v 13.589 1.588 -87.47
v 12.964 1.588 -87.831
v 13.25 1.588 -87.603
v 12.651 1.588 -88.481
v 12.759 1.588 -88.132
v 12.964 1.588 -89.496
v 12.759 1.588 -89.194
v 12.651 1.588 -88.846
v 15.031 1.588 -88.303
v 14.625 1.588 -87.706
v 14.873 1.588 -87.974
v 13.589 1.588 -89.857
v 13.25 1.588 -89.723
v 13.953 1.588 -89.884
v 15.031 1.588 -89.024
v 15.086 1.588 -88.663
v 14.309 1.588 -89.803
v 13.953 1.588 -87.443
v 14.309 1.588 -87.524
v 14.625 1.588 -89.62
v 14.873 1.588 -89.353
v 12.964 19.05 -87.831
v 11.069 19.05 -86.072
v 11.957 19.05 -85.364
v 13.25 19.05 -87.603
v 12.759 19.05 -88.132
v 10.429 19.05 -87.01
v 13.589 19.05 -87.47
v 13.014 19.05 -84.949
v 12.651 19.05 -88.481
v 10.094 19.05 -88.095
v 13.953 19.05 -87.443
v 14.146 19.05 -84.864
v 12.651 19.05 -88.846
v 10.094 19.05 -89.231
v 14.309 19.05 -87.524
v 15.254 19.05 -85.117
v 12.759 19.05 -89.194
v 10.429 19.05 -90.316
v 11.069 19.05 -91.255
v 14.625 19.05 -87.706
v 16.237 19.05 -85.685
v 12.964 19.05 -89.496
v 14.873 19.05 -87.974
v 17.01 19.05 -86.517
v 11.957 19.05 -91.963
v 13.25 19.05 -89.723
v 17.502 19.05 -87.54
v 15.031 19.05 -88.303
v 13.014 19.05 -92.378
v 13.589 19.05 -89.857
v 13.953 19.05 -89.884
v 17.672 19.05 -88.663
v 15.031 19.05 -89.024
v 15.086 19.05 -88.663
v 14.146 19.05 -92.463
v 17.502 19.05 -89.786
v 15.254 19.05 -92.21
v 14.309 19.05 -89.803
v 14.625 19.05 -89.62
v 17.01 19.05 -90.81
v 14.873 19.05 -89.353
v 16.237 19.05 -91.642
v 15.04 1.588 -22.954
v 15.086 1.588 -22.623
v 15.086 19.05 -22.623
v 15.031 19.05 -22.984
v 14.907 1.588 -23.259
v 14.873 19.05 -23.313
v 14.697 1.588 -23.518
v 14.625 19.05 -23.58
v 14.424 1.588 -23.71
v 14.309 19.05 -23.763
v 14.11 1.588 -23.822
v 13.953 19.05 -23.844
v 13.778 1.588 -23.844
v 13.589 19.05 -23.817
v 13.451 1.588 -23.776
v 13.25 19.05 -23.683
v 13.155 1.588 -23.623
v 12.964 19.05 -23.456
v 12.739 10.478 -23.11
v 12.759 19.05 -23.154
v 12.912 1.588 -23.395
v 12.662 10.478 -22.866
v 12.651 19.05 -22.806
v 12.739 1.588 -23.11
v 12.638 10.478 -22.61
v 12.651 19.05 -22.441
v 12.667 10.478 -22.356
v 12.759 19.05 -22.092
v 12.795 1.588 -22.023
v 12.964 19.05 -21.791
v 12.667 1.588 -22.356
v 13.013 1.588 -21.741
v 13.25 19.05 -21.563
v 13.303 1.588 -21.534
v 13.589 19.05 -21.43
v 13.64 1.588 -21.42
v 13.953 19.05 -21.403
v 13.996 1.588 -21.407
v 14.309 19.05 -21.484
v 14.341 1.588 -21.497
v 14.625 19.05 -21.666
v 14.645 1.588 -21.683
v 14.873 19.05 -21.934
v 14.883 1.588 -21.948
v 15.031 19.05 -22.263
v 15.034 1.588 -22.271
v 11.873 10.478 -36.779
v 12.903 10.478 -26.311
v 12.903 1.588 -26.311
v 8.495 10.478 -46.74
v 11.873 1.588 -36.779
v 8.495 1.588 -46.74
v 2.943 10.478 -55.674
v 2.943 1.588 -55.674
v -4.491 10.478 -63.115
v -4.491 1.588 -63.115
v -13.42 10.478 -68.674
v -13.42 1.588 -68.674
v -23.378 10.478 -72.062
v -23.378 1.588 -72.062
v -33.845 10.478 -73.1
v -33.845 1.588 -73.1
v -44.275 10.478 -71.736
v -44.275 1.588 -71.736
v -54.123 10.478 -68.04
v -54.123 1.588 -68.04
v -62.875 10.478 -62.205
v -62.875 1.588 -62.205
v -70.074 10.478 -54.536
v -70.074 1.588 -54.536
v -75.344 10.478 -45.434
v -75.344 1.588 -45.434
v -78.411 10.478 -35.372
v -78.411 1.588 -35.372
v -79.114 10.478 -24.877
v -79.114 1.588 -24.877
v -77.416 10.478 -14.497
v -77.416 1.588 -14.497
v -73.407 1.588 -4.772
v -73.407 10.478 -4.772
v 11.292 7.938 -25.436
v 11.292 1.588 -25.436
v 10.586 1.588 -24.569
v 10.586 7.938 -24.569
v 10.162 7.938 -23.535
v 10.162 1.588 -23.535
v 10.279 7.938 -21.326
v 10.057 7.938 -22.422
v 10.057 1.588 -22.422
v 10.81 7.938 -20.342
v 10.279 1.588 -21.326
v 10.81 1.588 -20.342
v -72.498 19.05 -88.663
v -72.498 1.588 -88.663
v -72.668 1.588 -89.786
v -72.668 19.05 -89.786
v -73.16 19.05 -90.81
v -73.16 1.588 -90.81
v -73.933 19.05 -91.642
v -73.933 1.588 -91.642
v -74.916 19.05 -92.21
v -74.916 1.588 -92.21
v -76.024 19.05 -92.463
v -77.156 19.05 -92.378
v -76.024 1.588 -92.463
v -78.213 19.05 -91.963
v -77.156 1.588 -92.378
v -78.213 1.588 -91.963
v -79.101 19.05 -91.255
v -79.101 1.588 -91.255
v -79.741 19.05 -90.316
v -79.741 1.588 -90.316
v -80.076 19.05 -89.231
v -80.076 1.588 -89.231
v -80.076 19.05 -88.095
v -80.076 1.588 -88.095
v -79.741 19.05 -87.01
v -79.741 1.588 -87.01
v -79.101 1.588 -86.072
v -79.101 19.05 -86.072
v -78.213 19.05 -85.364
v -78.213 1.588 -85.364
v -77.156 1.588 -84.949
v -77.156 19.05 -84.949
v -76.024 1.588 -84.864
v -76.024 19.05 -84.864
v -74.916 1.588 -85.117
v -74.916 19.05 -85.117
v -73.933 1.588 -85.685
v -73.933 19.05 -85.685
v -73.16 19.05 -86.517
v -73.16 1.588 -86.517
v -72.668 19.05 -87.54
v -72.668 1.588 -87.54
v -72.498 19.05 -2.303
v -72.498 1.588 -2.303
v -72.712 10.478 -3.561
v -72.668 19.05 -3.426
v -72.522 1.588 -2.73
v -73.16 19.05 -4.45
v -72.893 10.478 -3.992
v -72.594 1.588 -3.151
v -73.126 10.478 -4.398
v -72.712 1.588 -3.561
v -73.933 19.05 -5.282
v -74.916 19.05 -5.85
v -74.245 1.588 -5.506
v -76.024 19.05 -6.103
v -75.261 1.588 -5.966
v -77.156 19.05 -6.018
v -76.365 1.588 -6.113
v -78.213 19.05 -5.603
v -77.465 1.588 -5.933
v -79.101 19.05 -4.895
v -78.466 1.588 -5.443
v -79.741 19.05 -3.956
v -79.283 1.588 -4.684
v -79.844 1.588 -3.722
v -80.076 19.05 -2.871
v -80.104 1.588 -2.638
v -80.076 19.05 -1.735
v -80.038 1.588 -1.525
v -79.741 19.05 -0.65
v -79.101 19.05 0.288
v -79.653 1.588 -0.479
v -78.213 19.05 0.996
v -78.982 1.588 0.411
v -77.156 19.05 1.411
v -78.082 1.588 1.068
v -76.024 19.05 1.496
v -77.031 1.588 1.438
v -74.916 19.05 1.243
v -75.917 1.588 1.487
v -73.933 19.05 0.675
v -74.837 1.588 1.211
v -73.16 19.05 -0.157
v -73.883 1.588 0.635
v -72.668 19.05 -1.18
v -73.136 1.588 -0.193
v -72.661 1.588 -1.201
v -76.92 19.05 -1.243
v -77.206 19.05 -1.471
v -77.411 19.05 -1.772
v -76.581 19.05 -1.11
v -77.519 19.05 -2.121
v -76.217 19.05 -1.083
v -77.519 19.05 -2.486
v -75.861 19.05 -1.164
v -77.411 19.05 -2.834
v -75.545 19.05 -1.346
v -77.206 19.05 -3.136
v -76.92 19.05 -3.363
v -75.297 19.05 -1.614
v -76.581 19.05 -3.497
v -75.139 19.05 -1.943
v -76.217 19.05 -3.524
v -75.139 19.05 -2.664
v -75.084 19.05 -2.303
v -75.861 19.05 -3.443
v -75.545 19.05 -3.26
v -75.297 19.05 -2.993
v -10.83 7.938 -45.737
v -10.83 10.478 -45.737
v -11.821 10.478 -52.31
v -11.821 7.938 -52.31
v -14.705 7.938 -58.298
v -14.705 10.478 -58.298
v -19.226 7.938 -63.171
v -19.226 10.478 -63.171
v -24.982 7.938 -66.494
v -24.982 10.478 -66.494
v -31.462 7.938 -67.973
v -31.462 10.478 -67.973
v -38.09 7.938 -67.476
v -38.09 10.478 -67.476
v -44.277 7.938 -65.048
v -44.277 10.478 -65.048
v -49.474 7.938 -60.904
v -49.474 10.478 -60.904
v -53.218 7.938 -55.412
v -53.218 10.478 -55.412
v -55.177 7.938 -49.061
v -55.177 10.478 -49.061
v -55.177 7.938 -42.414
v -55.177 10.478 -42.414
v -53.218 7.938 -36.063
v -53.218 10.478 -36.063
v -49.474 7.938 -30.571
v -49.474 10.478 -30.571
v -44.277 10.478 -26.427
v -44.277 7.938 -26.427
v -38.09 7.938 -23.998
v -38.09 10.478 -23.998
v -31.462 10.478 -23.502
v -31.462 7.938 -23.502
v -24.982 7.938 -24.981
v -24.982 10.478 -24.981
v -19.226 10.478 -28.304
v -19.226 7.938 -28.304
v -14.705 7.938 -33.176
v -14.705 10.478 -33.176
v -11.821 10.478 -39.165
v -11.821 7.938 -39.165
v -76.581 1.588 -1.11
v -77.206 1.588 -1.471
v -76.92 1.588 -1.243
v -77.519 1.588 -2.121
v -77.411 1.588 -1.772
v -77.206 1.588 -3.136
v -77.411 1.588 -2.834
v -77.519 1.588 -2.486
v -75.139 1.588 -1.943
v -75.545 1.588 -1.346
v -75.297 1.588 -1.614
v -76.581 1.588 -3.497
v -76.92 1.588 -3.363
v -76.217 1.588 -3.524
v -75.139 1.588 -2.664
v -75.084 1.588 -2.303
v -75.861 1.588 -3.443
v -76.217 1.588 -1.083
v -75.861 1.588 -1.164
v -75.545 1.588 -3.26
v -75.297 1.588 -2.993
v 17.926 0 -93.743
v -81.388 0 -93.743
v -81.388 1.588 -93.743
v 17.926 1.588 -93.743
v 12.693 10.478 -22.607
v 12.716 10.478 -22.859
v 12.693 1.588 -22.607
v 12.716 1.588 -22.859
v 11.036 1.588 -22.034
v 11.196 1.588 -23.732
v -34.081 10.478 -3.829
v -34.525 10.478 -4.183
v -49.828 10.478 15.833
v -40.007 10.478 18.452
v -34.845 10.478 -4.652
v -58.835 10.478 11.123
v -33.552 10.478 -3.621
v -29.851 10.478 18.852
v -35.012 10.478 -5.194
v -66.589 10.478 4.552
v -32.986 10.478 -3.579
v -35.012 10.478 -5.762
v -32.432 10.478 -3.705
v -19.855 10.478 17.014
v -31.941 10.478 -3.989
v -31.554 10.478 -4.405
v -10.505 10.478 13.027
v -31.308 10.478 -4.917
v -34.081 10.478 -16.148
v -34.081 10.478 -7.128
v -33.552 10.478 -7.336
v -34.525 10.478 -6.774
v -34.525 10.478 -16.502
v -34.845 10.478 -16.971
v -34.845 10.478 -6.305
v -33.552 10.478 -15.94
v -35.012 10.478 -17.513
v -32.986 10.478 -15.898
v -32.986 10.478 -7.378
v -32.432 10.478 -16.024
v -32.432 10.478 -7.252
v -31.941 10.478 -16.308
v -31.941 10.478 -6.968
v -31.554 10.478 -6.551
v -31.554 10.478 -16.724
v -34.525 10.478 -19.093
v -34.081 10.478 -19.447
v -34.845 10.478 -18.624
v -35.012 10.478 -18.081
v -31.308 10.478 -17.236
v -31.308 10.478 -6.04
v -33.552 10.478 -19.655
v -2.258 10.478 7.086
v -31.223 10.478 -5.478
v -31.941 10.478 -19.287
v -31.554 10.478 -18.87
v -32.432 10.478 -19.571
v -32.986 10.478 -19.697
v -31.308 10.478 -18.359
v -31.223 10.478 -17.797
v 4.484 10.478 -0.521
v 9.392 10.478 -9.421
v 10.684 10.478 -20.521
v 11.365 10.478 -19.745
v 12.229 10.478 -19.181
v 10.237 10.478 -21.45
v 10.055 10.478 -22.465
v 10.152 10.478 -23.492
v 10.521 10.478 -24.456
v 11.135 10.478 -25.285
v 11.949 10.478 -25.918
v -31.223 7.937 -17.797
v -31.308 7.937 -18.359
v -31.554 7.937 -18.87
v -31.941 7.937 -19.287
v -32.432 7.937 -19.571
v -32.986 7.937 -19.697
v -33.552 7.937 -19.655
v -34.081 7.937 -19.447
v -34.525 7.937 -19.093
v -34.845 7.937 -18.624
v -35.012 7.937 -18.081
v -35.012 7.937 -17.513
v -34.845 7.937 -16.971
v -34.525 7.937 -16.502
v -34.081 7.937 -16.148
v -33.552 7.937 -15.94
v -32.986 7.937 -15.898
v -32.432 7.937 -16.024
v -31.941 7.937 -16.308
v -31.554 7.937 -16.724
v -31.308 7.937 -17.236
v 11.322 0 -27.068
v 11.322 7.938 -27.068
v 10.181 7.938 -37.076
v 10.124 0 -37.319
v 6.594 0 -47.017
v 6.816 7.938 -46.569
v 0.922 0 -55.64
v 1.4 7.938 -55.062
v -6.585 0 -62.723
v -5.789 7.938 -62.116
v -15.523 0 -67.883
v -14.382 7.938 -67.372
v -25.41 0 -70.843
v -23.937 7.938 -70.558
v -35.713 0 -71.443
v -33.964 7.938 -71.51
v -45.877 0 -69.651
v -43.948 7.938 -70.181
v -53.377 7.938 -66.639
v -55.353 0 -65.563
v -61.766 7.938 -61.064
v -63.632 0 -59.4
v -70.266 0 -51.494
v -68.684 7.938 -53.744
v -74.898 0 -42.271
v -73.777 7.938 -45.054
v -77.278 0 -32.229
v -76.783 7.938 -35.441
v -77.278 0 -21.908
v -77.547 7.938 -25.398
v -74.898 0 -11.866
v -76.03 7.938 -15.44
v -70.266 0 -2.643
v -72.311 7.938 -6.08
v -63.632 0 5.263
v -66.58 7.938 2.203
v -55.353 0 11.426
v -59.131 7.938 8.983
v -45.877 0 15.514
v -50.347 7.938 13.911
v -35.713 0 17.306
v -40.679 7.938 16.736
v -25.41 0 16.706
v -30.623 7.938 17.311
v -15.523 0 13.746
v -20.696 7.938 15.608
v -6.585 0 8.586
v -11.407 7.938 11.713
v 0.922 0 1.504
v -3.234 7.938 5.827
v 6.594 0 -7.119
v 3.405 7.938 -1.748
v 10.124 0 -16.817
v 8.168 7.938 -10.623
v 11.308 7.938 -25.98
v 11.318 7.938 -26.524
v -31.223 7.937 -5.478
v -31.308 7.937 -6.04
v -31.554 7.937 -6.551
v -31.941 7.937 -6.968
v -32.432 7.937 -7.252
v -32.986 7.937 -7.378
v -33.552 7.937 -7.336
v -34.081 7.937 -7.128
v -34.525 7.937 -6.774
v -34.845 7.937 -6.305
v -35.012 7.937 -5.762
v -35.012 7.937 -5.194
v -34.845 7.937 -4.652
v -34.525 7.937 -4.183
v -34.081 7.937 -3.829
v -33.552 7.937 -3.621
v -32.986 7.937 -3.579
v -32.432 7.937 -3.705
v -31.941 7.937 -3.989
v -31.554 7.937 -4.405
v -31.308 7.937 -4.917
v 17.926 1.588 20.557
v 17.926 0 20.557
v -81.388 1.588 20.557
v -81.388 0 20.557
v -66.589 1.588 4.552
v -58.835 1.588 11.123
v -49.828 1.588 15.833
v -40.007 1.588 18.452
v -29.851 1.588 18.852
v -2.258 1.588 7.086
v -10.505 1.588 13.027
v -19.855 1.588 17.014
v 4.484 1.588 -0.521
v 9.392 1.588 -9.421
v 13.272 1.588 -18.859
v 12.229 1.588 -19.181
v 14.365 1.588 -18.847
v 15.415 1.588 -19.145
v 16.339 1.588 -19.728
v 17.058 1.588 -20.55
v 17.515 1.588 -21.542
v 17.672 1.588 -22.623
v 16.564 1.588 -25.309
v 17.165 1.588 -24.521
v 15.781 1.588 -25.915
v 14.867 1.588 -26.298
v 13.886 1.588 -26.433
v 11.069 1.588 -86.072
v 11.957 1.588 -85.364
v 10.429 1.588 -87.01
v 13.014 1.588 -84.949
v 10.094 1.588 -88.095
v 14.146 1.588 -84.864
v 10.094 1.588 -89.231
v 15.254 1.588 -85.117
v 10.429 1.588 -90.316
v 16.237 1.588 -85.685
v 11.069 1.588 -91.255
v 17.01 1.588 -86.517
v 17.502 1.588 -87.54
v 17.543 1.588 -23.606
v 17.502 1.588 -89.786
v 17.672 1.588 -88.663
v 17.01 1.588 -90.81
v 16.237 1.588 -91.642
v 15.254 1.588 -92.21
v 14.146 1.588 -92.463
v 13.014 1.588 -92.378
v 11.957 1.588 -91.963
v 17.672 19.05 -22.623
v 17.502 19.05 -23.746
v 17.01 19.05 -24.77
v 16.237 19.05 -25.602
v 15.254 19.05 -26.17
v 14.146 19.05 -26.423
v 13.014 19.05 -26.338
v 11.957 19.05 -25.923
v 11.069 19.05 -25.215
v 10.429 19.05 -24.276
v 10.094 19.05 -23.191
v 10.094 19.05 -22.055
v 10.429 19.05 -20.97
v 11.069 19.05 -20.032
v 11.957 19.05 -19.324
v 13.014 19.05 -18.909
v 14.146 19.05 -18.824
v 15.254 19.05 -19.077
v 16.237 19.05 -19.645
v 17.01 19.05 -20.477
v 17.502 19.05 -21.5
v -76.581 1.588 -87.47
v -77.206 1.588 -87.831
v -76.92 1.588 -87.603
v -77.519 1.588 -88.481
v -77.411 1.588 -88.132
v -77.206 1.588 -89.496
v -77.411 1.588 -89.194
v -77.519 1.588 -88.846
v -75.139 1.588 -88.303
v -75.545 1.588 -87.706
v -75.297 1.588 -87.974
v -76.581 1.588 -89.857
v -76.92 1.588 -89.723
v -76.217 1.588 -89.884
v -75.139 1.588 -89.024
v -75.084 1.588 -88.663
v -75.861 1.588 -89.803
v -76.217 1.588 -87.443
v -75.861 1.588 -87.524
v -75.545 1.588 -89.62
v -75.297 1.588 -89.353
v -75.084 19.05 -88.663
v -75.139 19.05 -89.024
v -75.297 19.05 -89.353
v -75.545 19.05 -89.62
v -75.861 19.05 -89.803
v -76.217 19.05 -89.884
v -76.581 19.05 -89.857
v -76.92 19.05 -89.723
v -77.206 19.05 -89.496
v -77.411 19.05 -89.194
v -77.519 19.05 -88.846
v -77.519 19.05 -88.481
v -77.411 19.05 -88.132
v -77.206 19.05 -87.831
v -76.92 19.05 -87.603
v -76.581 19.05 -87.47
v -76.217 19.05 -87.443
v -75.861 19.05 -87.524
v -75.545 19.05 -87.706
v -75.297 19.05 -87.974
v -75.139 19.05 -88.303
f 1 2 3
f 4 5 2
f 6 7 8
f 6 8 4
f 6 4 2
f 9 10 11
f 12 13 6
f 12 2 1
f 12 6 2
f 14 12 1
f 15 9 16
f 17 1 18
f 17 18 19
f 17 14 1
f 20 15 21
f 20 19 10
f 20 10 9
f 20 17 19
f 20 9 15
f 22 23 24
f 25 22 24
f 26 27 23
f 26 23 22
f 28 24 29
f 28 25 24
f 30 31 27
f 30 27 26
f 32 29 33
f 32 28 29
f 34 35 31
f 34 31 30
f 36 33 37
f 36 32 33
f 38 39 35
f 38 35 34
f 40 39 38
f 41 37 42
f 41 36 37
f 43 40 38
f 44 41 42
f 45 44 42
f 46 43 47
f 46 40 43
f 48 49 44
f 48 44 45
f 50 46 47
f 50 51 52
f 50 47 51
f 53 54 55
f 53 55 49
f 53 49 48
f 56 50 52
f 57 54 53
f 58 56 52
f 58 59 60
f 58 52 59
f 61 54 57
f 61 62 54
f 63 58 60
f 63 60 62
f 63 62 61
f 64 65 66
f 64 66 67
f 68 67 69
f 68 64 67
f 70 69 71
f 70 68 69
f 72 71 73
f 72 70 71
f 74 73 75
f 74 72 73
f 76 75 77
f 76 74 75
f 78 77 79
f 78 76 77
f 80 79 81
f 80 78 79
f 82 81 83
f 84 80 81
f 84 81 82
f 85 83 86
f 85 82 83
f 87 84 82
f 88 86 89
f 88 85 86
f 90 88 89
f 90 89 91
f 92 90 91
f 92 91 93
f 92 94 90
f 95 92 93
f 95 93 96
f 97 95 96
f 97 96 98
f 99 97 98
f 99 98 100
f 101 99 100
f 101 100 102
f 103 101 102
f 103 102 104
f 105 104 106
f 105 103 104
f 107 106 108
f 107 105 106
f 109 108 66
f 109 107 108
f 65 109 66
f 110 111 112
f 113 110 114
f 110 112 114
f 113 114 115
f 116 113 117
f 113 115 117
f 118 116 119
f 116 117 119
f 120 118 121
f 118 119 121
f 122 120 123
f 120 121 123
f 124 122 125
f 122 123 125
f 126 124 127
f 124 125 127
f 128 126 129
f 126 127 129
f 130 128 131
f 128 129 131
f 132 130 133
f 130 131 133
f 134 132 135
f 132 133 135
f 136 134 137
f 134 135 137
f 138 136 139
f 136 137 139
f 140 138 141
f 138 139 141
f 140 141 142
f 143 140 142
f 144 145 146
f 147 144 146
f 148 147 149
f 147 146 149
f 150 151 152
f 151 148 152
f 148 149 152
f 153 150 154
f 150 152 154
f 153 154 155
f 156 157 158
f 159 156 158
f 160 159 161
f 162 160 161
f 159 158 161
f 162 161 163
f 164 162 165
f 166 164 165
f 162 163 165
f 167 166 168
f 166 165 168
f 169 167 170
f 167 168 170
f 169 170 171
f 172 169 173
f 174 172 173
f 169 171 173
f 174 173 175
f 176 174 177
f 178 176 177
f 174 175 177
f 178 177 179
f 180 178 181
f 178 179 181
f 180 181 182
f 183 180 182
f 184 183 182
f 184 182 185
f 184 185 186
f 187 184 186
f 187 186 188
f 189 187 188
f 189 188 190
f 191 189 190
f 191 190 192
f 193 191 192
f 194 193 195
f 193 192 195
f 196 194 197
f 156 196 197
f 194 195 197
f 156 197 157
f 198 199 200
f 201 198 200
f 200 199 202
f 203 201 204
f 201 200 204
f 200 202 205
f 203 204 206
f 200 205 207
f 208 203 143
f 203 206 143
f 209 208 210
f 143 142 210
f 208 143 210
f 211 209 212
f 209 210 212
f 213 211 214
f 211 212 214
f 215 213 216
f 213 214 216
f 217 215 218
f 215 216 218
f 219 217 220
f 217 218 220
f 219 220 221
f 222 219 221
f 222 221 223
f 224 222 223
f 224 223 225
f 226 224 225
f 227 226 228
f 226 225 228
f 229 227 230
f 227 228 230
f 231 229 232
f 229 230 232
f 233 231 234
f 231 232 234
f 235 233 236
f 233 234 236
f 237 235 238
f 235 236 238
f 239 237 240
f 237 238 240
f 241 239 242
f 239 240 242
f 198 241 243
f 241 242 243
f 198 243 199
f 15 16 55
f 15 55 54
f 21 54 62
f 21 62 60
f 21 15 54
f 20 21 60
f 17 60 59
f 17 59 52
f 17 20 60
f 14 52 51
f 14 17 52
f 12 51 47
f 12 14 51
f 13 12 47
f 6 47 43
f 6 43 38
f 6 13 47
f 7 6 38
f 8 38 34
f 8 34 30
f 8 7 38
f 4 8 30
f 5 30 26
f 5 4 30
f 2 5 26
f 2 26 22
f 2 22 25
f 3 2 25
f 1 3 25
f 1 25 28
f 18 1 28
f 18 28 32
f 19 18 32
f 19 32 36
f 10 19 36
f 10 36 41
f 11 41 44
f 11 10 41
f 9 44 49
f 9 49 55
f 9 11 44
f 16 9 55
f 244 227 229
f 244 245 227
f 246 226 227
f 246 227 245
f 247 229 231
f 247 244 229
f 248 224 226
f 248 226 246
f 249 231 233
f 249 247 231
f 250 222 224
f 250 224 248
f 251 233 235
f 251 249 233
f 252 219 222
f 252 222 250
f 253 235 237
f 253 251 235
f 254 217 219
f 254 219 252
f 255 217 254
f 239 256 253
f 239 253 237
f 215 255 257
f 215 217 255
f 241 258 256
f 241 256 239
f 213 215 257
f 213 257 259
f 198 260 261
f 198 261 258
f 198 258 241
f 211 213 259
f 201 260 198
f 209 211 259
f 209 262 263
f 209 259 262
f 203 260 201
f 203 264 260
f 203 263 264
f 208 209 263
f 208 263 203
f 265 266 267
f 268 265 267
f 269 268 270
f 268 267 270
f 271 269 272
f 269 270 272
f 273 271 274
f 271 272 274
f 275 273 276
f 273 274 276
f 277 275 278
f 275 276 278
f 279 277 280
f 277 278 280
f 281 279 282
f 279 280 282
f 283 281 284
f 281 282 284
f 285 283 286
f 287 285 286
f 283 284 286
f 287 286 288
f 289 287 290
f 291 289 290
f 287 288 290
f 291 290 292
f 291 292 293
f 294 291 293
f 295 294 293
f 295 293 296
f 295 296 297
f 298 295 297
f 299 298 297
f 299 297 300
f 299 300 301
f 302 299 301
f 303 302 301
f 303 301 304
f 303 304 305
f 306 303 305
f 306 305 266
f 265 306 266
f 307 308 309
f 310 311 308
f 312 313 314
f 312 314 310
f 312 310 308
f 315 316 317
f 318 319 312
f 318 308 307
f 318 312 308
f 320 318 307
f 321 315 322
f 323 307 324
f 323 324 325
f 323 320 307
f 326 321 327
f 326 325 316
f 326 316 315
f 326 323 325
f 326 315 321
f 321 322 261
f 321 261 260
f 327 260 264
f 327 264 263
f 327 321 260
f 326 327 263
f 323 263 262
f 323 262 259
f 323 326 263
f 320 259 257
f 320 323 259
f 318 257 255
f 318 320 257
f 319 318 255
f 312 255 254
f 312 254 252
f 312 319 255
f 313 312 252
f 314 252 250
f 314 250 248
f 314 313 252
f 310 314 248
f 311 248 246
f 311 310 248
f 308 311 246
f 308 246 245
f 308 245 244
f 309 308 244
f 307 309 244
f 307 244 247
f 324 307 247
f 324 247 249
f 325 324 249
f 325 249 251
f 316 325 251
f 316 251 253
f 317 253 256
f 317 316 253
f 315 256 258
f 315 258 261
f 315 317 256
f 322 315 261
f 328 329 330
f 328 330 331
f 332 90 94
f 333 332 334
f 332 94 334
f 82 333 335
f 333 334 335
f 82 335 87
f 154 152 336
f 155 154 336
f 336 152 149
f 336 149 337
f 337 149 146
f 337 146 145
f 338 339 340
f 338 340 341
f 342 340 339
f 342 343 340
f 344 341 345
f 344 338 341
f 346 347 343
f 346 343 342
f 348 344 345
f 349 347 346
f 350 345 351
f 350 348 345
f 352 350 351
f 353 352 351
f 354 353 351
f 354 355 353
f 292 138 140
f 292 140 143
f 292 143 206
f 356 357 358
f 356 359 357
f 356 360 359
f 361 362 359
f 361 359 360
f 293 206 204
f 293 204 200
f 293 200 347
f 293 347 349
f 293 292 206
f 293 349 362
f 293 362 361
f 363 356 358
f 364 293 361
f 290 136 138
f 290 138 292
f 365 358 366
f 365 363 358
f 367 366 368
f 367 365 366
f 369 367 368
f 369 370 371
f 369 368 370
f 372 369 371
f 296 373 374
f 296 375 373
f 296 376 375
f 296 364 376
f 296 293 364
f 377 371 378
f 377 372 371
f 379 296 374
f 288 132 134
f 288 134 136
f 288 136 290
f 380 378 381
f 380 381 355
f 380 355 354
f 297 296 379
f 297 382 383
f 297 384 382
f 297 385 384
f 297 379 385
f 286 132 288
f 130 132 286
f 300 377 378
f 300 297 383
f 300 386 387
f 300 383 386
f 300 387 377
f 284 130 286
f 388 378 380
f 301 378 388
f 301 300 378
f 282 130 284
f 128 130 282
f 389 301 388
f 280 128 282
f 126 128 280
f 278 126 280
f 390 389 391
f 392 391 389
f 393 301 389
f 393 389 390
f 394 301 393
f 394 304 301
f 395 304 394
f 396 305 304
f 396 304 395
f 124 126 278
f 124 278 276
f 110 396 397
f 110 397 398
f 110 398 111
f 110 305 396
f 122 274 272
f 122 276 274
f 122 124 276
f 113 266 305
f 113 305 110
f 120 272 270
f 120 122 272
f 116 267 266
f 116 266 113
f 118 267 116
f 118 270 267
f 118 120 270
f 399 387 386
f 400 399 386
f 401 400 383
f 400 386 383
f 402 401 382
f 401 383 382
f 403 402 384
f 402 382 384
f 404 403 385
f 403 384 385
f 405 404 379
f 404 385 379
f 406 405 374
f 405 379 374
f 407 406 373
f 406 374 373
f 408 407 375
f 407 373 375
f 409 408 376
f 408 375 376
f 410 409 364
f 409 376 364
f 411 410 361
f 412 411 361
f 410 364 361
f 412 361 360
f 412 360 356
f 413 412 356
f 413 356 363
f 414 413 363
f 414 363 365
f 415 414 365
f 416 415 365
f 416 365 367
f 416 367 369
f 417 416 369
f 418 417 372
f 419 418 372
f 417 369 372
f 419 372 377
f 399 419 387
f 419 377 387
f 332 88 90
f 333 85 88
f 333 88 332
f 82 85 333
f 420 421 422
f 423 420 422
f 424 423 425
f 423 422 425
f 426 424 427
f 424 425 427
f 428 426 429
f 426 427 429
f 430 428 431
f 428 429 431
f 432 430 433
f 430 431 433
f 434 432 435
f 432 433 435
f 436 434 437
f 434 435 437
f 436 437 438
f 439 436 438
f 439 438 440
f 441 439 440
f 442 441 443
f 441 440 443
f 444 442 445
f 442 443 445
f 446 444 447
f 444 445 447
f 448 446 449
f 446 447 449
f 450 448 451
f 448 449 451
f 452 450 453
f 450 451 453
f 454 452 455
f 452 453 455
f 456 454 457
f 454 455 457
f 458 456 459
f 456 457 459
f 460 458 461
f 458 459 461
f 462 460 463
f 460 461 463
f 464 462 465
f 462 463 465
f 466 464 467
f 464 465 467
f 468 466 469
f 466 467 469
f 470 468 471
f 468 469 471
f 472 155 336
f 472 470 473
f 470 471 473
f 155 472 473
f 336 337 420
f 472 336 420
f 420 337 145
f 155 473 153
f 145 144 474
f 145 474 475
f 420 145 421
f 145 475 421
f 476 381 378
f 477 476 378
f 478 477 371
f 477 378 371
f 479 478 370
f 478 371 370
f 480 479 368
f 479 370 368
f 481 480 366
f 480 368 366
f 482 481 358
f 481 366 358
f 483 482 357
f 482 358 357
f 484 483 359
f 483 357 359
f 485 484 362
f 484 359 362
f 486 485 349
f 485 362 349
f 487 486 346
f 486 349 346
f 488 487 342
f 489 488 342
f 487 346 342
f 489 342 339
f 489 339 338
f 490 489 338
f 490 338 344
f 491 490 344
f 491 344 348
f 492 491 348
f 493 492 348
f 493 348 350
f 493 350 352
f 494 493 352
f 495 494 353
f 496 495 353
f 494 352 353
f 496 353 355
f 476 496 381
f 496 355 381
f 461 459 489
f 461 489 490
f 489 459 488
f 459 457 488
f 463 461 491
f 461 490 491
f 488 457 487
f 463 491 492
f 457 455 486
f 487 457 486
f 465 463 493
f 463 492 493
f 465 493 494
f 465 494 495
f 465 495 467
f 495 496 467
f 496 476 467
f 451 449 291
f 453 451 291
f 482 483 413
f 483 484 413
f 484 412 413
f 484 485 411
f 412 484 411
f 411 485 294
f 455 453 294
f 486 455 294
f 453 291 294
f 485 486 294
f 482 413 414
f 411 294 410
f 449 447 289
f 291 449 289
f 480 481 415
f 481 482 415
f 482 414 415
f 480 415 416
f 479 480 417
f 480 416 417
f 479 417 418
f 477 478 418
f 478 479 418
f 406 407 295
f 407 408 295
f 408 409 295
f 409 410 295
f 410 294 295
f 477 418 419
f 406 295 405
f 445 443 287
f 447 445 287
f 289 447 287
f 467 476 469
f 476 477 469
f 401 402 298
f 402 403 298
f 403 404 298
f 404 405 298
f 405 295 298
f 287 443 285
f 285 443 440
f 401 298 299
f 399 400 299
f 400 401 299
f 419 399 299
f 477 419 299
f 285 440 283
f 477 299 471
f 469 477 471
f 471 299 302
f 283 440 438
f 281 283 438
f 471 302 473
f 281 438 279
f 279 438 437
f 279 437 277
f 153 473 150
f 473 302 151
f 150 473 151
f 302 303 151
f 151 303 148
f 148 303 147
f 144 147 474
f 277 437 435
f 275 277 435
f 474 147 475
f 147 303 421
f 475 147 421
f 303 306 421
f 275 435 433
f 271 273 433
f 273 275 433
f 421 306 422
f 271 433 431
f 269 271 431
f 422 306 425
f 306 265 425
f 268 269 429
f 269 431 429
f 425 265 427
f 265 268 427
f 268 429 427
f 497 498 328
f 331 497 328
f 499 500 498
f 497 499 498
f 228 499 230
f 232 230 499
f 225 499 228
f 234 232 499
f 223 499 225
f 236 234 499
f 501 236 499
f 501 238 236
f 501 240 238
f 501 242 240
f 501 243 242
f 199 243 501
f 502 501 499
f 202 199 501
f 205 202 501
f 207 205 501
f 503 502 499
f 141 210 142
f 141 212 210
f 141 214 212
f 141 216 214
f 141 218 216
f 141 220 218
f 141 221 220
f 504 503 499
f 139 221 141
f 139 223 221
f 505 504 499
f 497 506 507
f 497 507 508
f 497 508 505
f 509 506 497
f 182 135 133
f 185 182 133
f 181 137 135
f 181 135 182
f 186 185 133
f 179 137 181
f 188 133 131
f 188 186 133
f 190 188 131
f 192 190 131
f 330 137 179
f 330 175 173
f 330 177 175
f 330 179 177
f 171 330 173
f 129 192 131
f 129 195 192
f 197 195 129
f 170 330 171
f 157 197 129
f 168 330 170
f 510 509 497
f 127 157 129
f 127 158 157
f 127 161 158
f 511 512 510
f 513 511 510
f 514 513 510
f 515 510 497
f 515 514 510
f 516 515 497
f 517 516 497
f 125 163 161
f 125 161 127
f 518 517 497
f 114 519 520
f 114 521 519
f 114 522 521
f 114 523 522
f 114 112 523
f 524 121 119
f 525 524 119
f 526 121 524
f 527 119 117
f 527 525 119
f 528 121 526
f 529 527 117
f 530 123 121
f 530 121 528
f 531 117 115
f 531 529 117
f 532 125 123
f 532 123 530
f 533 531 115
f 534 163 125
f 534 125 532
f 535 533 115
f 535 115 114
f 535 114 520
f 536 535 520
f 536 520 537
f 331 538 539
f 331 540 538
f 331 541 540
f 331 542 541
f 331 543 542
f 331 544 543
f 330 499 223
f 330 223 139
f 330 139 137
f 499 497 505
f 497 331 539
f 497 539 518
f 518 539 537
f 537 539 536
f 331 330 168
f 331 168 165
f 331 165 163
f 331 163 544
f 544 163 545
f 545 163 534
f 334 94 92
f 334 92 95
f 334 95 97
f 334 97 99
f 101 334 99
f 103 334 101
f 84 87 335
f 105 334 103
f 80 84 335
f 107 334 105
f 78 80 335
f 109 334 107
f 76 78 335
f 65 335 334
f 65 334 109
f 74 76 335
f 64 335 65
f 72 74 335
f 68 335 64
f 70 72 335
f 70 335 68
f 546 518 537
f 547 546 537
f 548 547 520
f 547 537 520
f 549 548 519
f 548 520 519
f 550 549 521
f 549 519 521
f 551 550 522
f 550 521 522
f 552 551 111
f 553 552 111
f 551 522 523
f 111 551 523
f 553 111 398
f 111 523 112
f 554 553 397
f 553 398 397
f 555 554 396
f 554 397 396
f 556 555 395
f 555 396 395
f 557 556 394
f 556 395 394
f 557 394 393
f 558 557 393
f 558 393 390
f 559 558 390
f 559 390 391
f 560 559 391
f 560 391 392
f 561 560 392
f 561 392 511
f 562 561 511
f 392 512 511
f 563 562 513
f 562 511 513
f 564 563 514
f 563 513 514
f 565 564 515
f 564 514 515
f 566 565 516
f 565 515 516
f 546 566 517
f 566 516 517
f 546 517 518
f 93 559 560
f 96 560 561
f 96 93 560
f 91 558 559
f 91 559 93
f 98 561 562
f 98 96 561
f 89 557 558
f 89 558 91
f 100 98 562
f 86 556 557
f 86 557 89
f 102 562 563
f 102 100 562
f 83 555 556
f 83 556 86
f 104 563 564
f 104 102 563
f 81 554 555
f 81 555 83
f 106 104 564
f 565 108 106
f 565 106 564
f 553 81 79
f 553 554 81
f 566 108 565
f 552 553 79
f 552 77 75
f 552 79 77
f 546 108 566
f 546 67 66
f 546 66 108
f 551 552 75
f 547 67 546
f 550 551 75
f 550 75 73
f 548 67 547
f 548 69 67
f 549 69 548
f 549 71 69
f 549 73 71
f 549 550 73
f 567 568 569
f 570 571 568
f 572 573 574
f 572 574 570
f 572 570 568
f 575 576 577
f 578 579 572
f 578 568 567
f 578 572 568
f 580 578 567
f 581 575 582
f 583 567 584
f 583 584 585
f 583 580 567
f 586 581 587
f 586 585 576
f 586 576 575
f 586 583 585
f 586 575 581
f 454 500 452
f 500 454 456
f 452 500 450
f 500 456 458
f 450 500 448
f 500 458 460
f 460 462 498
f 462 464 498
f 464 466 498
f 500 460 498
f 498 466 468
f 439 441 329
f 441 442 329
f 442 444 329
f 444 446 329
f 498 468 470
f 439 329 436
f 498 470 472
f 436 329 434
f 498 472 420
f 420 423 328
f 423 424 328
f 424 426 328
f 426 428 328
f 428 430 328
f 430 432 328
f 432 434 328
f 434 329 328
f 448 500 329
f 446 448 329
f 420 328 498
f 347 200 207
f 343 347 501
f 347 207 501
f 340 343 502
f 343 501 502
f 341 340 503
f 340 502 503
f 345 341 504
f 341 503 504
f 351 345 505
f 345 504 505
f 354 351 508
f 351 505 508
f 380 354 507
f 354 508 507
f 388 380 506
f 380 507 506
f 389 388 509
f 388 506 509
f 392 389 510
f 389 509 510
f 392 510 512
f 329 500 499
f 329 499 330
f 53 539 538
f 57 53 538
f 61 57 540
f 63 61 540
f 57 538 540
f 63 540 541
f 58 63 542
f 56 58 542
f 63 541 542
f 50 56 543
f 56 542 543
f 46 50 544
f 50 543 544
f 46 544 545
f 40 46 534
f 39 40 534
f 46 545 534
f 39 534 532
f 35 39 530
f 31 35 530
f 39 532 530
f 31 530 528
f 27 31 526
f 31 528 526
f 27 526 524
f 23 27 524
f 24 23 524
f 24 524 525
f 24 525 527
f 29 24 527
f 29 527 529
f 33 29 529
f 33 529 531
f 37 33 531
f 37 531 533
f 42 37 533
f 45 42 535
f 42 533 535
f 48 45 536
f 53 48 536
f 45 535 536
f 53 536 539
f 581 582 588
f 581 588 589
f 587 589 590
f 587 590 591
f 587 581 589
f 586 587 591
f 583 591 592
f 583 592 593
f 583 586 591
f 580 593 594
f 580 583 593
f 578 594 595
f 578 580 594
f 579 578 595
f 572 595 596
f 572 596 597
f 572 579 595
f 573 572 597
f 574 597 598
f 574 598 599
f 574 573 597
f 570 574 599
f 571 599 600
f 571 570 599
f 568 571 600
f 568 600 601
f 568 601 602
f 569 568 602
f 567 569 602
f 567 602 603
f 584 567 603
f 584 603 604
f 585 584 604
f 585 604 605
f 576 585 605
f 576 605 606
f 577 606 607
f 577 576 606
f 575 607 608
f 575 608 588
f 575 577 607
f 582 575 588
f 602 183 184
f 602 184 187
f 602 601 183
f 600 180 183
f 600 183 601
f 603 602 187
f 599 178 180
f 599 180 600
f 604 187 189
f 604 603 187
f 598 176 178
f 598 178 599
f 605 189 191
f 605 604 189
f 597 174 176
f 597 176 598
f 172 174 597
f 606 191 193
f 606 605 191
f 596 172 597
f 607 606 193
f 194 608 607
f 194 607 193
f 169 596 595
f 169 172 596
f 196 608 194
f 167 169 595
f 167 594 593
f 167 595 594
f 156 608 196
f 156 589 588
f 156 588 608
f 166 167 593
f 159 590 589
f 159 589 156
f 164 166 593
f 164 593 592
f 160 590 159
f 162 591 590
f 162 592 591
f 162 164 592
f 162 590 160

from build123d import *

# Parameters (mm, degrees)
SKETCH1_W                        = 99.314
SKETCH1_H                        = 114.3
MAIN_DEPTH                       = 1.5875
SKETCH3_R                        = 46.0375
RAISED_DISK_EDGE_DEPTH           = 10.4775
SKETCH4_R                        = 44.45
DISK_HOLLOW_DEPTH                = 8.9375
SKETCH5_R                        = 1.905
SCREW_HOLES_ON_FRONT_PANEL_DEPTH = 2.54
SKETCH6_R                        = 3.81
SKETCH6_R_2                      = 1.2239625
MOUNTING_POSTS_DEPTH             = 17.4625
HOLLOW_REACH                     = 12.478
SKETCH8_R                        = 22.29794733


with BuildPart() as part:
    # Sketch1 → main (new body)
    with BuildSketch(Plane(origin=(0, 0, 0), x_dir=(1, 0, 0), z_dir=(0, 1, 0))):
        with Locations((-31.731304389, 36.593342839)):
            Rectangle(SKETCH1_W, SKETCH1_H)
    extrude(amount=MAIN_DEPTH)


with BuildPart() as body_2:
    # Sketch3 → raised disk edge (new body)
    with BuildSketch(Plane(origin=(0, 0, 0), x_dir=(1, 0, 0), z_dir=(0, 1, 0))):
        with Locations((-33.128304389, 27.068342839)):
            Circle(SKETCH3_R)
    extrude(amount=RAISED_DISK_EDGE_DEPTH)


with BuildPart() as disk_hollow_tool:
    # Sketch4 → disk hollow (new body, through all)
    with BuildSketch(Plane(origin=(0, 7.9375, 0), x_dir=(1, 0, 0), z_dir=(0, 1, 0))):
        with Locations((-33.128304389, 27.068342839)):
            Circle(SKETCH4_R)
    extrude(amount=-DISK_HOLLOW_DEPTH)


with BuildPart() as part_1:
    add(part.part)

    # disk hollow: cut by disk_hollow_tool
    add(disk_hollow_tool.part, mode=Mode.SUBTRACT)



with BuildPart() as body_2_1:
    add(body_2.part)

    # disk hollow: cut by disk_hollow_tool
    add(disk_hollow_tool.part, mode=Mode.SUBTRACT)

    # Sketch5 → screw holes on front panel (cut)
    with BuildSketch(Plane(origin=(0, 10.4775, 0), x_dir=(1, 0, 0), z_dir=(0, 1, 0))):
        with Locations((-33.128304389, 17.797342839)):
            Circle(SKETCH5_R)
        with Locations((-33.128304389, 5.478342839)):
            Circle(SKETCH5_R)
    extrude(amount=-SCREW_HOLES_ON_FRONT_PANEL_DEPTH, mode=Mode.SUBTRACT)


with BuildPart() as part_2:
    add(part_1.part)

    add(body_2_1.part)  # mounting posts merges body 2
    # Sketch6 → mounting posts (add)
    with BuildSketch(Plane(origin=(0, 1.5875, 0), x_dir=(1, 0, 0), z_dir=(0, 1, 0))):
        with Locations((-76.308304389, 2.303342839)):
            Circle(SKETCH6_R)
        with Locations((-76.308304389, 2.303342839)):
            Circle(SKETCH6_R_2, mode=Mode.SUBTRACT)
        with Locations((13.861695611, 22.623342839)):
            Circle(SKETCH6_R)
        with Locations((13.861695611, 22.623342839)):
            Circle(SKETCH6_R_2, mode=Mode.SUBTRACT)
        with Locations((-76.308304389, 88.663342839)):
            Circle(SKETCH6_R)
        with Locations((-76.308304389, 88.663342839)):
            Circle(SKETCH6_R_2, mode=Mode.SUBTRACT)
        with Locations((13.861695611, 88.663342839)):
            Circle(SKETCH6_R)
        with Locations((13.861695611, 88.663342839)):
            Circle(SKETCH6_R_2, mode=Mode.SUBTRACT)
    extrude(amount=MOUNTING_POSTS_DEPTH)

    # Sketch8 → hollow (cut, up to next)
    with BuildSketch(Plane(origin=(0, 10.4775, 0), x_dir=(1, 0, 0), z_dir=(0, 1, 0)), mode=Mode.PRIVATE) as hollow_sk1:
        with Locations((-33.128304389, 45.737342839)):
            Circle(SKETCH8_R)
    hollow_tool1 = extrude(hollow_sk1.sketch, amount=-HOLLOW_REACH, mode=Mode.PRIVATE) & part_2.part
    add(hollow_tool1.solids().sort_by_distance((-33.128304, 10.4775, -45.737343))[0], mode=Mode.SUBTRACT)


solid = part_2.part
